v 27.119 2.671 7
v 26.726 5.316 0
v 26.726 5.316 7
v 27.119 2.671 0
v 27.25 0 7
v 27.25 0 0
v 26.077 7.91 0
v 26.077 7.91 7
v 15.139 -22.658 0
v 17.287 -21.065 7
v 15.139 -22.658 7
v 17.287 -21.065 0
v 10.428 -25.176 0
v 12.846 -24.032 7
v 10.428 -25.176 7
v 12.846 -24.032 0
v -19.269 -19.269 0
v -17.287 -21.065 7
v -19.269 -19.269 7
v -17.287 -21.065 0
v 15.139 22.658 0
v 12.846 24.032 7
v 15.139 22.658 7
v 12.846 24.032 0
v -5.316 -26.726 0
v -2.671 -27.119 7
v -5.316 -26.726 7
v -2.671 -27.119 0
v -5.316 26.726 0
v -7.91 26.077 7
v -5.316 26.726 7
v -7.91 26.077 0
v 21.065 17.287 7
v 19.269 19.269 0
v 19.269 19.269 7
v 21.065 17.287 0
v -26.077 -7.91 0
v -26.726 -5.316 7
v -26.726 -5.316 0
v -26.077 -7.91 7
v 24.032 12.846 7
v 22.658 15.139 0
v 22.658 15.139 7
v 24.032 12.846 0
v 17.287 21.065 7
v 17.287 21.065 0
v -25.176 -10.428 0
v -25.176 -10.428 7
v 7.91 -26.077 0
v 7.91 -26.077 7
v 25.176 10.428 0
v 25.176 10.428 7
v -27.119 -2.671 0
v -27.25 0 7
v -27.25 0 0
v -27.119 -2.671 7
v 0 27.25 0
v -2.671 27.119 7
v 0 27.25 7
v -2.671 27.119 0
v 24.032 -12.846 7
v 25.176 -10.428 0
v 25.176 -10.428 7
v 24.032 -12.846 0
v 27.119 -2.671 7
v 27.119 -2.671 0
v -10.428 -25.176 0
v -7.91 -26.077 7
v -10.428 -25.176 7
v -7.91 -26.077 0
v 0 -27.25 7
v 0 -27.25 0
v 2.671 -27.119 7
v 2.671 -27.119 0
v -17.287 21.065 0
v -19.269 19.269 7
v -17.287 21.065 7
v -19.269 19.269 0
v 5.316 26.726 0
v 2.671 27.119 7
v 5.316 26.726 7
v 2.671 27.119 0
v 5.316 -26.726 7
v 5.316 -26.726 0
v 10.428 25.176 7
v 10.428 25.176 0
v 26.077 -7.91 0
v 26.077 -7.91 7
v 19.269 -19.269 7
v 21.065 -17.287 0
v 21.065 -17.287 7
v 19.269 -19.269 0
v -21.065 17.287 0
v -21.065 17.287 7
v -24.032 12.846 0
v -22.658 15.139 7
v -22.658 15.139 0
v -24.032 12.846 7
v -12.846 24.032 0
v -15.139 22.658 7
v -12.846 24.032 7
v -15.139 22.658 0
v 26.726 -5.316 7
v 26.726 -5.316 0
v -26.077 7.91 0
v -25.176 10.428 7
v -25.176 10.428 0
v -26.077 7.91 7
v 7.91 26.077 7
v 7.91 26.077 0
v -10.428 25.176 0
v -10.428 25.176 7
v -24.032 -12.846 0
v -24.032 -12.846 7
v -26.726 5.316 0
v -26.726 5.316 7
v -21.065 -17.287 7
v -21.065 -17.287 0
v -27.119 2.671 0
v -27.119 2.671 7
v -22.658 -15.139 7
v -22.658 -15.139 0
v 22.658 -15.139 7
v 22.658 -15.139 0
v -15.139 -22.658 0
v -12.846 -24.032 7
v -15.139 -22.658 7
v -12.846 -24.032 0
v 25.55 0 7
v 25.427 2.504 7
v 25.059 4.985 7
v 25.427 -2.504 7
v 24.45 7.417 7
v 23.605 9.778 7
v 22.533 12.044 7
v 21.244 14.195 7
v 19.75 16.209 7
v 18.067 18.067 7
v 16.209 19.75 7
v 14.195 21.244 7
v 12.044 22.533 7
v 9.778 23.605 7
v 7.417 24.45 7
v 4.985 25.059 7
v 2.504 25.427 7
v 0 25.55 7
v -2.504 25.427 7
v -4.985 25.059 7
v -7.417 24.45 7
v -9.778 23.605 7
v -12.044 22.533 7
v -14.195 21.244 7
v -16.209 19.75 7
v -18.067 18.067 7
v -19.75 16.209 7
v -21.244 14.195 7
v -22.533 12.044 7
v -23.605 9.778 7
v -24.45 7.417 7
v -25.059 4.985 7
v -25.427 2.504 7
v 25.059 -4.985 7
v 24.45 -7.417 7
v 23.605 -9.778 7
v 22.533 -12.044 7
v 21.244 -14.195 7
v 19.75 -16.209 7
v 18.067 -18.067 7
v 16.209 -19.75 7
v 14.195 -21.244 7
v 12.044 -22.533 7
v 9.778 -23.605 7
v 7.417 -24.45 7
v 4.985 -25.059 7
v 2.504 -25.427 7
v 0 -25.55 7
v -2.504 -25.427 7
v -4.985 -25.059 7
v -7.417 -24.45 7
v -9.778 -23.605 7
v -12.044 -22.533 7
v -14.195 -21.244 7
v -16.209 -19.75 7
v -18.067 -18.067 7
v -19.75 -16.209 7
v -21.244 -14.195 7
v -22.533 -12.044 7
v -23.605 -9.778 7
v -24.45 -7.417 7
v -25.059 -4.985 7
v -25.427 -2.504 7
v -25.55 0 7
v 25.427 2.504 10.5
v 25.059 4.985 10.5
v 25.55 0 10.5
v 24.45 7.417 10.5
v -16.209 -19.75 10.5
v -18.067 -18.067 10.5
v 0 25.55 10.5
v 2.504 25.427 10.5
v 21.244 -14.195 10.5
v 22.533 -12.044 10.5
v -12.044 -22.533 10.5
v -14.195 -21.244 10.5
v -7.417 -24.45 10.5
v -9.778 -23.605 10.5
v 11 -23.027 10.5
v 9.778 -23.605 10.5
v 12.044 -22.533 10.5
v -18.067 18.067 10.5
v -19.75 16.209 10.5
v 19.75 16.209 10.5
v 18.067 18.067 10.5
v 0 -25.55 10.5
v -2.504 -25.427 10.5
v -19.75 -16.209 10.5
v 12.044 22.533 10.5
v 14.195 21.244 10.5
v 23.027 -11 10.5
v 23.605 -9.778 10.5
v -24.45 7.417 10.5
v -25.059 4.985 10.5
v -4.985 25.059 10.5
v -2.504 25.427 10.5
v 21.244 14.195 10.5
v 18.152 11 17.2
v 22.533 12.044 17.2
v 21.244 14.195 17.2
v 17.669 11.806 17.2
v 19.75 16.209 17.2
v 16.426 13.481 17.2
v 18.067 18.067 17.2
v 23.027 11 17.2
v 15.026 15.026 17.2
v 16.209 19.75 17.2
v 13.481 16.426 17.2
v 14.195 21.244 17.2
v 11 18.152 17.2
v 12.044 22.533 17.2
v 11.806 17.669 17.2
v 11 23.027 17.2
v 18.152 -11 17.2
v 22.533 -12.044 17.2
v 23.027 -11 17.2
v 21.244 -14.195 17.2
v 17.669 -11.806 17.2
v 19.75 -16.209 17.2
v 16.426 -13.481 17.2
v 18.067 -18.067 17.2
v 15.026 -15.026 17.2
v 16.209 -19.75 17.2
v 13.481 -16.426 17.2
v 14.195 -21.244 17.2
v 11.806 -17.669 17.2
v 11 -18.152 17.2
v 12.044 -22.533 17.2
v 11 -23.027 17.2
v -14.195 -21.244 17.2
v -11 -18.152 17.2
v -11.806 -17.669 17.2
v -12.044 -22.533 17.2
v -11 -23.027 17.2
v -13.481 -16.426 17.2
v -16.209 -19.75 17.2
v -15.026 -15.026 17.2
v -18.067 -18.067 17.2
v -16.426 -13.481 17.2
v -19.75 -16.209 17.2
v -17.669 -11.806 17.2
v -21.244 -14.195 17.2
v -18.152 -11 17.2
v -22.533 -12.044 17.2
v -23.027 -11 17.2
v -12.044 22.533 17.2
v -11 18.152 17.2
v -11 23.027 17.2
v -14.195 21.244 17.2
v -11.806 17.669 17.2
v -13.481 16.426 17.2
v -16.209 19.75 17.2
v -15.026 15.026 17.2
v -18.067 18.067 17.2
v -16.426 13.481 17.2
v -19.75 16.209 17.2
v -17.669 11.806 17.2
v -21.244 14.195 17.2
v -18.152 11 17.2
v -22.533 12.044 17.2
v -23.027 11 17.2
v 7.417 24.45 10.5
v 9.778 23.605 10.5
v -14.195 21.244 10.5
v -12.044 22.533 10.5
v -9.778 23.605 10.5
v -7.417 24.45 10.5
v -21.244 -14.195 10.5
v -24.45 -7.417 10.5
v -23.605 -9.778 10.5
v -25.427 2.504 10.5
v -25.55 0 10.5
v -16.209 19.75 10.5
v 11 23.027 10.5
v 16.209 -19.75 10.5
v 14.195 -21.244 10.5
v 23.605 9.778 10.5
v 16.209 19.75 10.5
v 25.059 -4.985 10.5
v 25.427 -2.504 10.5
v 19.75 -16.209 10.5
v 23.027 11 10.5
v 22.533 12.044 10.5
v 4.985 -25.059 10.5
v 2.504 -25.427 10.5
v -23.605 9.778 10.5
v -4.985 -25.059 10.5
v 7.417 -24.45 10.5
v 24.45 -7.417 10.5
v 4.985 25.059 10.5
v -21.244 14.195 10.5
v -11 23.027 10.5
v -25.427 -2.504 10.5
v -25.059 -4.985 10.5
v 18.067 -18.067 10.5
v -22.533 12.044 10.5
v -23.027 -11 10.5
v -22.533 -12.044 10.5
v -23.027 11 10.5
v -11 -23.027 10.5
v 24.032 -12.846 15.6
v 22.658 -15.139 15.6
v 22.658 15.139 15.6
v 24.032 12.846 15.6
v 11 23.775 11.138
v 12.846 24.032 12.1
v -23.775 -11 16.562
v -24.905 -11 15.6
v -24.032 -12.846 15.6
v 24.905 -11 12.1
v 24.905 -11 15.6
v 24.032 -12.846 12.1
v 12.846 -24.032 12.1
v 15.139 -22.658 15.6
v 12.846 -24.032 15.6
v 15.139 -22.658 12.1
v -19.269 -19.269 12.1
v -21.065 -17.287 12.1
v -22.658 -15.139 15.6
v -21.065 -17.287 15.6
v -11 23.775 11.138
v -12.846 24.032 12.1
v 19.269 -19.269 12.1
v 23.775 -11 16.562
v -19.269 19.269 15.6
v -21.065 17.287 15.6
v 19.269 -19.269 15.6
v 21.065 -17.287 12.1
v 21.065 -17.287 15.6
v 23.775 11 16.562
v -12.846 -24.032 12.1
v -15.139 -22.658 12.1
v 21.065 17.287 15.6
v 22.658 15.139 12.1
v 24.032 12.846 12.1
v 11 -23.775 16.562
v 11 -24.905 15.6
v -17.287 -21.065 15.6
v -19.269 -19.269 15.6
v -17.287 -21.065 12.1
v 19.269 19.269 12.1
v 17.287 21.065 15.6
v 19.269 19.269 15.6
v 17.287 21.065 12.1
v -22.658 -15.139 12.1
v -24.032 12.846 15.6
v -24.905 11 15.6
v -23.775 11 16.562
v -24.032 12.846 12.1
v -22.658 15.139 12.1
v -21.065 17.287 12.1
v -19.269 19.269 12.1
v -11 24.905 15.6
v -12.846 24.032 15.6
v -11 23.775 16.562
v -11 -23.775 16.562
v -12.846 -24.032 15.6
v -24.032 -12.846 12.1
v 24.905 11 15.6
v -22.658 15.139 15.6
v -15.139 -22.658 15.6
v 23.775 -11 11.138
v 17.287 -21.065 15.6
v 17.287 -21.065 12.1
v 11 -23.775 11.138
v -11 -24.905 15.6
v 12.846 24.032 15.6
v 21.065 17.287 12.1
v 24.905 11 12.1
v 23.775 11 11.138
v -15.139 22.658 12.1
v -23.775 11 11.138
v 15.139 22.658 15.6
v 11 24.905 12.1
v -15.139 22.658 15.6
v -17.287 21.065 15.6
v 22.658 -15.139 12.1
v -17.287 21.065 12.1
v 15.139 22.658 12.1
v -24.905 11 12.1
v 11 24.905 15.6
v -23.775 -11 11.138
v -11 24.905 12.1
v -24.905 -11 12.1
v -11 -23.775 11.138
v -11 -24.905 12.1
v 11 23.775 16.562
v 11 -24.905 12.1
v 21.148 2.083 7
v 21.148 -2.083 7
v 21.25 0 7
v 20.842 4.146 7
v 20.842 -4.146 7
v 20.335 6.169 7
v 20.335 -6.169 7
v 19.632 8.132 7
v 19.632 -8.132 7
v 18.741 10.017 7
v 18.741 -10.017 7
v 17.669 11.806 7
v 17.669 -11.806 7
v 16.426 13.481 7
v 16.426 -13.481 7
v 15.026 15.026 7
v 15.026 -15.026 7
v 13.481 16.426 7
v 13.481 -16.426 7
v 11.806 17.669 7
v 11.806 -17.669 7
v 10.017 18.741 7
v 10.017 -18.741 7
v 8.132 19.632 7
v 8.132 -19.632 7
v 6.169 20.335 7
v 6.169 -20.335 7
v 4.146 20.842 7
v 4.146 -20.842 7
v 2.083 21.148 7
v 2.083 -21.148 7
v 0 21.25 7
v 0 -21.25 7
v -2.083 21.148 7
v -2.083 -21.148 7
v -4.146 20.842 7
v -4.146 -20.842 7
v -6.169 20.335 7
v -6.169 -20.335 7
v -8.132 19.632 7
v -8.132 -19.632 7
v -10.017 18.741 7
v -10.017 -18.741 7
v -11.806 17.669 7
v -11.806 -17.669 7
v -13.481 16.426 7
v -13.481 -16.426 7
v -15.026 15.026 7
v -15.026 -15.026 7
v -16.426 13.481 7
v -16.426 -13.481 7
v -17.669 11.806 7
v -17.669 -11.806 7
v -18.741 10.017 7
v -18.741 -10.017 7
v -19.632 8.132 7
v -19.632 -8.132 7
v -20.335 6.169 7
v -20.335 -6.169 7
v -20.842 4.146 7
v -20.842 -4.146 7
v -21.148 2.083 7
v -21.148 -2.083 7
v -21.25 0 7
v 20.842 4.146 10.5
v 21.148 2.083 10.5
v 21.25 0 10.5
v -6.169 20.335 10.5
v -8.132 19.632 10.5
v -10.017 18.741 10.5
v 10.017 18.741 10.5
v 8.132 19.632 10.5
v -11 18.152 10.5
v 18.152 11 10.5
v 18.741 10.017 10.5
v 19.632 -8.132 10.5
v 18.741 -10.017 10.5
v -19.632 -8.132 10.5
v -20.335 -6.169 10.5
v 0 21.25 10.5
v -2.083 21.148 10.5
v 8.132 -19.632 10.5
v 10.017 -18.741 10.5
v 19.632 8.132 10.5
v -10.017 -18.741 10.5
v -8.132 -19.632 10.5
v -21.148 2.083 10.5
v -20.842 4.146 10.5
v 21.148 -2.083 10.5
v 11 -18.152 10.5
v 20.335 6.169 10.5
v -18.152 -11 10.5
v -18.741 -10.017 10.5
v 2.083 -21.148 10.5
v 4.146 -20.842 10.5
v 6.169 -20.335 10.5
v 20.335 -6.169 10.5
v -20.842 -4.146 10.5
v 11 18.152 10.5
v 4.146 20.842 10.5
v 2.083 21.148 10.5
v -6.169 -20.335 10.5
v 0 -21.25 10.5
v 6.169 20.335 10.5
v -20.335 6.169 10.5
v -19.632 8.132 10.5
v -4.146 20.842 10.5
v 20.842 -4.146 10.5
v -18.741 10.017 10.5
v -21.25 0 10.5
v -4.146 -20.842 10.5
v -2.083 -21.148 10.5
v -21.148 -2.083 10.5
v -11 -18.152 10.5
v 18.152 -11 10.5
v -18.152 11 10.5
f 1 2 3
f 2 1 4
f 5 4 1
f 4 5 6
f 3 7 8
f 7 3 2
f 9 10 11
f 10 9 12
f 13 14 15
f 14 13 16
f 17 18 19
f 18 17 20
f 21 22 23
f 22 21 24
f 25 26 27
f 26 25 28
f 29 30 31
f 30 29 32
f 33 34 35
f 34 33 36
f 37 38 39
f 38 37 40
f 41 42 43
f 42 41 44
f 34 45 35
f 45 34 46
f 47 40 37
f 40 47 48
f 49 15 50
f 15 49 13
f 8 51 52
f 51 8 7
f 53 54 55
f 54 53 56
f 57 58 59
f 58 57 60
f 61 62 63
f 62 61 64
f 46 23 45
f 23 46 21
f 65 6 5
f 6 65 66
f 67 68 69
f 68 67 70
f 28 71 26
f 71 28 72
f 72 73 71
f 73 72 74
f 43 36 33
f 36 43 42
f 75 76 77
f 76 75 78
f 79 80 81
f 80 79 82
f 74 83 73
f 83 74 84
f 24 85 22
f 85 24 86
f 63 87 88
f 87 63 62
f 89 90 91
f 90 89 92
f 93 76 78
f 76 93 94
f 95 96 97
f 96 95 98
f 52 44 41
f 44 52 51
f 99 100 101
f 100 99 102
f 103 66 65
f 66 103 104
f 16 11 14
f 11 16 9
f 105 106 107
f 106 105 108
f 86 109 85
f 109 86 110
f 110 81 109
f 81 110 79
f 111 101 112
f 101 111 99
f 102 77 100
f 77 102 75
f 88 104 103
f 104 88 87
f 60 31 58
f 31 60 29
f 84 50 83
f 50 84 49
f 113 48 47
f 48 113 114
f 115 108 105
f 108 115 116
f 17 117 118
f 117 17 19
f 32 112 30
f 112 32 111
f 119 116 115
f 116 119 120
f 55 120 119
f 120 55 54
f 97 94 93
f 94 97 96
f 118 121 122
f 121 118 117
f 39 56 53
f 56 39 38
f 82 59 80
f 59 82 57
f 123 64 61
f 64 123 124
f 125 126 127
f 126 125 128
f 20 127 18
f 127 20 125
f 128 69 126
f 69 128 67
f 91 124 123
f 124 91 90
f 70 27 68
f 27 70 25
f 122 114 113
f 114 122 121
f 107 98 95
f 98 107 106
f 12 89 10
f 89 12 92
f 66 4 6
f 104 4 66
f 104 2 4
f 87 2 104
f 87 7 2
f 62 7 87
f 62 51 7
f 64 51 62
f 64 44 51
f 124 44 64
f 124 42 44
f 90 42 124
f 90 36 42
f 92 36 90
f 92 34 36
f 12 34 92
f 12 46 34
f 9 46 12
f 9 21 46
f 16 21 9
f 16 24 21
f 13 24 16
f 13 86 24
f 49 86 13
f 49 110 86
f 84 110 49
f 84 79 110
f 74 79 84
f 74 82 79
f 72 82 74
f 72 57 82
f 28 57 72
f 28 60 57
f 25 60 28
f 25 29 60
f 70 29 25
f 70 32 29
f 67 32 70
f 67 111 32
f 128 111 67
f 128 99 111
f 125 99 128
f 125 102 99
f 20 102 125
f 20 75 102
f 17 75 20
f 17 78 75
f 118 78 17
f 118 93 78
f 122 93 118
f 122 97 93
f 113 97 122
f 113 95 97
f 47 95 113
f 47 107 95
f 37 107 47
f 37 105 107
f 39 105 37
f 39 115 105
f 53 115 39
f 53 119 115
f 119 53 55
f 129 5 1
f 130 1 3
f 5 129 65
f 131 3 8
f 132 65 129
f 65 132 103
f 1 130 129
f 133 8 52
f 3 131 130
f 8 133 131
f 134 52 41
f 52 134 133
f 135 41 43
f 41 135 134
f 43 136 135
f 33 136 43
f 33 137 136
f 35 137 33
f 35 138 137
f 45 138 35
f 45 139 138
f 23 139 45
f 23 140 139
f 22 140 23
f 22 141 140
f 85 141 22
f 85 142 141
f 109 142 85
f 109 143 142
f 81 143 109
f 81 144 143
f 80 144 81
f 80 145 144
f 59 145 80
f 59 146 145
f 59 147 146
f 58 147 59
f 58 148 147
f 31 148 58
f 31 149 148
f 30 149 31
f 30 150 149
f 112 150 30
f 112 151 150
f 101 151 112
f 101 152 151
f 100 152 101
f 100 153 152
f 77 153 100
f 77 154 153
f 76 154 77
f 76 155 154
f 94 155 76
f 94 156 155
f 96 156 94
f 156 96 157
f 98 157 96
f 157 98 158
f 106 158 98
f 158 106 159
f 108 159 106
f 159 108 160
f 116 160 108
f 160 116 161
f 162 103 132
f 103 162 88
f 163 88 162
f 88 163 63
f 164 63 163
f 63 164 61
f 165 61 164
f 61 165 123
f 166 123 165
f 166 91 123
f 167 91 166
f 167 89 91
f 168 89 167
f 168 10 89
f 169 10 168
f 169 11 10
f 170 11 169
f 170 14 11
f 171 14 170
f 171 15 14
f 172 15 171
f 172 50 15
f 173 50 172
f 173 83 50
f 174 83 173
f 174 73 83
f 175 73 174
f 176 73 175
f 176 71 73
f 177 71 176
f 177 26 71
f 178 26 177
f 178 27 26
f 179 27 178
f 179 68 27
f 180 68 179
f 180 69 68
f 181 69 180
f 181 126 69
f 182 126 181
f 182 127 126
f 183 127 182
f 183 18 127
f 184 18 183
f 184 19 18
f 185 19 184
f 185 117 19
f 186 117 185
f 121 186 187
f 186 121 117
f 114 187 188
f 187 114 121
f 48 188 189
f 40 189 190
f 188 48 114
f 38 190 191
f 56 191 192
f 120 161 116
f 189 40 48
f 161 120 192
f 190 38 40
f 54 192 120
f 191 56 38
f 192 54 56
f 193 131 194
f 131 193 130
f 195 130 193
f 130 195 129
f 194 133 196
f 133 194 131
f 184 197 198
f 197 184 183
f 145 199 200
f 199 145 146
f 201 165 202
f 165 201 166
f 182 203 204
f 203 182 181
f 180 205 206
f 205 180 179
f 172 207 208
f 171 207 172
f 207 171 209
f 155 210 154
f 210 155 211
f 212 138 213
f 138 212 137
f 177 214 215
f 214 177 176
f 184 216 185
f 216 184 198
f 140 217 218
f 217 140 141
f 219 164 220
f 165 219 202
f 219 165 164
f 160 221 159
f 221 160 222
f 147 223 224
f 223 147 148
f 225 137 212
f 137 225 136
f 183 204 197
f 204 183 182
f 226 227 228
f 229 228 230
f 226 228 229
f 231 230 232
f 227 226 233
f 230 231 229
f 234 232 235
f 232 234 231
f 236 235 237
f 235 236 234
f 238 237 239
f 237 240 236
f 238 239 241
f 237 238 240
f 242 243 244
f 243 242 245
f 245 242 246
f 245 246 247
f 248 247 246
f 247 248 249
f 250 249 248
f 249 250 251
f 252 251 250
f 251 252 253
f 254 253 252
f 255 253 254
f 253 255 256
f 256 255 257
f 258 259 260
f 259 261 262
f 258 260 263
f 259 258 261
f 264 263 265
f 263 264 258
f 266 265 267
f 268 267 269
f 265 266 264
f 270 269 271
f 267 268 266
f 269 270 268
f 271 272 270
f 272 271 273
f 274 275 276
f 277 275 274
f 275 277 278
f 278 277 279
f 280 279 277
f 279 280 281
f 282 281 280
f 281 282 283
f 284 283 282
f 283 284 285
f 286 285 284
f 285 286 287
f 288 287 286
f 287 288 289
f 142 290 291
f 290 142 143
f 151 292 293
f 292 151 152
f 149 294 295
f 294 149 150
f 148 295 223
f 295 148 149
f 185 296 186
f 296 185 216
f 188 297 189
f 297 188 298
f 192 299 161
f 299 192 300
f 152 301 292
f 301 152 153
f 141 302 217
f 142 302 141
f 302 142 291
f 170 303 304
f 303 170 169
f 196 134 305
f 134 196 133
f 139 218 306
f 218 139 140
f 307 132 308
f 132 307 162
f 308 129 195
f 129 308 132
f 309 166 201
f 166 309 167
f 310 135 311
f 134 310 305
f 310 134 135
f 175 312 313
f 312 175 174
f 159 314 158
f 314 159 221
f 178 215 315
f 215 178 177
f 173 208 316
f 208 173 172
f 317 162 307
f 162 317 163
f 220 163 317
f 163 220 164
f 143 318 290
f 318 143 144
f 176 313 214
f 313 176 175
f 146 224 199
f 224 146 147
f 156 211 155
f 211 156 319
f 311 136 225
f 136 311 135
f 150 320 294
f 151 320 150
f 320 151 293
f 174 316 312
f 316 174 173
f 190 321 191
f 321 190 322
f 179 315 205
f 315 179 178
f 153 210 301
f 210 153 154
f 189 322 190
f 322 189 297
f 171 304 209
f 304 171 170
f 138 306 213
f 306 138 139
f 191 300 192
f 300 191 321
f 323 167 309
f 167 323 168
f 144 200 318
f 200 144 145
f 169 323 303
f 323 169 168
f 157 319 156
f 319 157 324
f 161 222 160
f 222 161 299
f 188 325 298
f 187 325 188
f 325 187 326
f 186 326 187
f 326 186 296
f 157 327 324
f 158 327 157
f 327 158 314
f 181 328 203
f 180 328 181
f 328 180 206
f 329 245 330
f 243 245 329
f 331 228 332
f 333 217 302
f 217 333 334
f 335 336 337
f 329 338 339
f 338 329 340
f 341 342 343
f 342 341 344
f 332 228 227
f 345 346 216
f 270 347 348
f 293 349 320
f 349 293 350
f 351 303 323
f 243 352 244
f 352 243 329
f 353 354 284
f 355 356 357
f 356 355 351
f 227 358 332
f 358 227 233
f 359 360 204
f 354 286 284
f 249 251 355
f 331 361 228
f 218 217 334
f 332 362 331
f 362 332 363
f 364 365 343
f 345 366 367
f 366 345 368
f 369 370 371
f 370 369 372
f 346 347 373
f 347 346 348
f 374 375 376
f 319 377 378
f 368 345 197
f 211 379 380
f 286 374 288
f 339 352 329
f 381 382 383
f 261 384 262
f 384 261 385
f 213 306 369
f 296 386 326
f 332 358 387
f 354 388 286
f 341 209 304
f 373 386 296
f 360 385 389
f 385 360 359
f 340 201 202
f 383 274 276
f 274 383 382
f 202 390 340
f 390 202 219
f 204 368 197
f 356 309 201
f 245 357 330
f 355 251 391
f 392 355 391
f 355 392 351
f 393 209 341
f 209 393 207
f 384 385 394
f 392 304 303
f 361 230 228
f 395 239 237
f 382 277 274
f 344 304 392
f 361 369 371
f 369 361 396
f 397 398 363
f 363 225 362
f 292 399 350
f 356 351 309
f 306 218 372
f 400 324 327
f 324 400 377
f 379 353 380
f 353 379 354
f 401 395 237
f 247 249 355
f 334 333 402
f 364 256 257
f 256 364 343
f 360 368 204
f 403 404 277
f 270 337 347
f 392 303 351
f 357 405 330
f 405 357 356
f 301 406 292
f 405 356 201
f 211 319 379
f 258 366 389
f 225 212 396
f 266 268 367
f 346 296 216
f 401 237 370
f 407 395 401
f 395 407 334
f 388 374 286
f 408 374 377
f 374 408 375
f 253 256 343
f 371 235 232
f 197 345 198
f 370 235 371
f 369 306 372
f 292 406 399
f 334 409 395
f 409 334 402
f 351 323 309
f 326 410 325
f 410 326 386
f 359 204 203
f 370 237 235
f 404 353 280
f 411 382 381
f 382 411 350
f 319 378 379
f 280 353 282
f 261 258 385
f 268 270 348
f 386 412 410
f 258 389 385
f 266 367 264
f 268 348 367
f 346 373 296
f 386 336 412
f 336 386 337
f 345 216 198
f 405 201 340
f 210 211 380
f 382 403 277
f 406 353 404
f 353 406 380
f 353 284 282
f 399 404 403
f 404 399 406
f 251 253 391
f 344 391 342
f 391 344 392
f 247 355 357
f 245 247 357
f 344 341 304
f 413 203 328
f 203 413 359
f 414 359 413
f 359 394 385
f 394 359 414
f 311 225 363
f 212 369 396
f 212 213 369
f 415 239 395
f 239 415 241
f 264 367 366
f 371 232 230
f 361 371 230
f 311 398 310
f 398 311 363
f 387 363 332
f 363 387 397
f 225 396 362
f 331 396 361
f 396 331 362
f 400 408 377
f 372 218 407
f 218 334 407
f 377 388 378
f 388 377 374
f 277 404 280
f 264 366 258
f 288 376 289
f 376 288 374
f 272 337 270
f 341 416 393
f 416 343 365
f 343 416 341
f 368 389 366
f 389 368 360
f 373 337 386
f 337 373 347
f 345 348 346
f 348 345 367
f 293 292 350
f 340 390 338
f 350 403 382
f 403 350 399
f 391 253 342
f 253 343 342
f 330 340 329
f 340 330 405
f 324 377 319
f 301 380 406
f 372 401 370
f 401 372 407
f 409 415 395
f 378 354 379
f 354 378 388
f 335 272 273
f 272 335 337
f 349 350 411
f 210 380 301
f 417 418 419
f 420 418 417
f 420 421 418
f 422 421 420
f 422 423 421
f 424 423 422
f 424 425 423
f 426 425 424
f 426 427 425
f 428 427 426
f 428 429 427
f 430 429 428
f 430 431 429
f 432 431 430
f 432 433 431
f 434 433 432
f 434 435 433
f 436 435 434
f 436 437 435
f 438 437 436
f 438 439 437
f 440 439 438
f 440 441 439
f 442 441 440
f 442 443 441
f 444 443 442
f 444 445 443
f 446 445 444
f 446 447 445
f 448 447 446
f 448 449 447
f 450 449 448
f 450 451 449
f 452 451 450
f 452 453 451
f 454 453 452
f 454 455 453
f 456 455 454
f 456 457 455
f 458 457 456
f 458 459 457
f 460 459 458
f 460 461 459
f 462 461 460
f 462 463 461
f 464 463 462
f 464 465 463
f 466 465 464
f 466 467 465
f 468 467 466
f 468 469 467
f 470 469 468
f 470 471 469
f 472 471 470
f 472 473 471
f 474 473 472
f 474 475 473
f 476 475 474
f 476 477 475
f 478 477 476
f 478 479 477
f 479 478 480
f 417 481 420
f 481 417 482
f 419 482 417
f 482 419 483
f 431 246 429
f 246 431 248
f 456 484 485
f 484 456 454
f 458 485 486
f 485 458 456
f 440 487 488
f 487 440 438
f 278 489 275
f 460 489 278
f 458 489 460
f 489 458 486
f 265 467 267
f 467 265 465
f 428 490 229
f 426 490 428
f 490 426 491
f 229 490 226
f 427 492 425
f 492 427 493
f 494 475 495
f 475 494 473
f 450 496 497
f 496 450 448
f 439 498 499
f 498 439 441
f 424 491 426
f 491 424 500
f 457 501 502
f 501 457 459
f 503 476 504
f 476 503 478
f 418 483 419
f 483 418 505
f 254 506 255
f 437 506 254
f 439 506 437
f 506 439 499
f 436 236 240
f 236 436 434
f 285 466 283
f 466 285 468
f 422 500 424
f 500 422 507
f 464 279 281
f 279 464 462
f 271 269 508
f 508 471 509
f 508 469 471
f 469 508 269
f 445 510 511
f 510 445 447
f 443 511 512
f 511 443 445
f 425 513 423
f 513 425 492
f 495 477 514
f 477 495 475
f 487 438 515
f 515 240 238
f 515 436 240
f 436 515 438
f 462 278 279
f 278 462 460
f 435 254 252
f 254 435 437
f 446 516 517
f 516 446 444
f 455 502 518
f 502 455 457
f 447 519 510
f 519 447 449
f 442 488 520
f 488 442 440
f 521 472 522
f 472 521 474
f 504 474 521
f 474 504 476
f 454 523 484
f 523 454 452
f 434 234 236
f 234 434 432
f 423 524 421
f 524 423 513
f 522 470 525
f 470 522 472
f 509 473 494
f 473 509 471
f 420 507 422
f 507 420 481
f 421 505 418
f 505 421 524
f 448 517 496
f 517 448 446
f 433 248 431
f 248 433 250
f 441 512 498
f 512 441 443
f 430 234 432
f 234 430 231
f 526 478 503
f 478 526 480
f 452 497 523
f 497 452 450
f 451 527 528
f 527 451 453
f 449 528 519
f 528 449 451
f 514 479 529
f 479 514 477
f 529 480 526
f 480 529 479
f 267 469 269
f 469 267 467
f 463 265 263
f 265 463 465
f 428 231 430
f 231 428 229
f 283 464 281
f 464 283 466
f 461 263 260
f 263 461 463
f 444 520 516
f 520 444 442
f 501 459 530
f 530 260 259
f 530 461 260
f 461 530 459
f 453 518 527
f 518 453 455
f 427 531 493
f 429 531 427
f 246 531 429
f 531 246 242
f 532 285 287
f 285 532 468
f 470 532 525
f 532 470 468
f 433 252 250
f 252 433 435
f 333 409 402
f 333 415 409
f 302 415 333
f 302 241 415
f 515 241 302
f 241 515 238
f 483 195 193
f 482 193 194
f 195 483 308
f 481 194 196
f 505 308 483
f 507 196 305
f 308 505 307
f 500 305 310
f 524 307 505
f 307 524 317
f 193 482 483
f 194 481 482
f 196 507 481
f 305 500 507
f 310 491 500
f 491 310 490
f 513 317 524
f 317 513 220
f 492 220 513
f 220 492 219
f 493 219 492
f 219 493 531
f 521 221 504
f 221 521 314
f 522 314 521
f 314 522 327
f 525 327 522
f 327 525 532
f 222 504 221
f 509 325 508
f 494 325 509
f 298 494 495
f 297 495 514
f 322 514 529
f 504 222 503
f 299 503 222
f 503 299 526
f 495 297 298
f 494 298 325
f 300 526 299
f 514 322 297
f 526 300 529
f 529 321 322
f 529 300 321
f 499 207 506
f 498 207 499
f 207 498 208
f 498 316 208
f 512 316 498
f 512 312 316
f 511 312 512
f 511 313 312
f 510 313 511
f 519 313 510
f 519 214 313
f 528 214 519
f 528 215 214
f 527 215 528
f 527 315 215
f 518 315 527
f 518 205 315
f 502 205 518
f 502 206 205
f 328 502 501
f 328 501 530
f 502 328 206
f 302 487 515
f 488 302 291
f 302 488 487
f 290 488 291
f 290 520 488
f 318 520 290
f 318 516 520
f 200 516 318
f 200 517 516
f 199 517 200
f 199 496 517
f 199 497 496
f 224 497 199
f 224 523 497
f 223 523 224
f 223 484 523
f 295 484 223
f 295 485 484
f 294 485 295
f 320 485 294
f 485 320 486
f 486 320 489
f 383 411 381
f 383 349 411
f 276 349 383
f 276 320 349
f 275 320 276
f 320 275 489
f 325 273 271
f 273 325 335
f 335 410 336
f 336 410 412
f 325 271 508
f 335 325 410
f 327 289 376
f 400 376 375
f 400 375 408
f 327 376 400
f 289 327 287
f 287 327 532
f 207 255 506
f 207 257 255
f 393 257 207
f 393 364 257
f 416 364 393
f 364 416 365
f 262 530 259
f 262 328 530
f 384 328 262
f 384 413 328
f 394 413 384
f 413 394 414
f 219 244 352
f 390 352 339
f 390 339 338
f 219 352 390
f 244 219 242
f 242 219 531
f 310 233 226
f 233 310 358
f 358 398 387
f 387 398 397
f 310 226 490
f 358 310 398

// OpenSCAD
/*
Wheel Center Cover
http://www.thingiverse.com/thing:1232850/

By Paul Houghton
Twitter: @mobile_rat
Email: paulirotta@gmail.com
Blog: http://paul-houghton.com/

Creative Commons Attribution ShareAlike License
https://creativecommons.org/licenses/by-sa/4.0/legalcode
*/


/* [Wheel Center Cover Options] */


// Radius of the cap (outside dimension)
Cap_Radius = 27.25;
// Height of the cap (how far it sticks out from the wheel surface)
Cap_Height = 7;
// Radius of the riser between the cap and the wheel grips
Throat_Radius = 25.55;
// Height of the wheel grips
Grip_Height = 17.2;

// Difference between inside and outside radius of the throat and wheel grips
Thickness = 6;
center_radius = Cap_Radius - Thickness;
// Height between the cap and the grips
notch_offset = 3.5;
notch_height = Grip_Height - notch_offset - Cap_Height; // from notch radially outward
// Height of corner rounding
Notch_Bevel_Height = 1.6;
// Width of space between wheel grips
Cut_Width = 22;
// Number of facets to approximate a circle
$fn=64;



difference() {
	union() {
		color("red") cap();
        color("green") throat();
		color("blue") notch();
	}
	union() {
        center_cutout();
		cut(0);
		cut(90);
		cut(180);
		cut(270);
	}
}

module cap() {
    cylinder(r=Cap_Radius, h=Cap_Height);
}

module throat() {
    cylinder(r=Throat_Radius, h=Grip_Height);    
}

module center_cutout() {
    translate([0, 0, Cap_Height]) cylinder(r=center_radius, h=Grip_Height);    
}

module notch() {
    translate([0, 0, Cap_Height + notch_offset]) hull() {
        cylinder(r=Throat_Radius, h=notch_height);
        translate([0, 0, Notch_Bevel_Height]) cylinder(r=Cap_Radius, h=notch_height - 2*Notch_Bevel_Height);
    }
}

module cut(angle) {
	rotate([0, 0, angle]) {
        translate([-Cut_Width/2, 0, Cap_Height + notch_offset]) 
            cube([Cut_Width, 100, 100]);
	}
}
